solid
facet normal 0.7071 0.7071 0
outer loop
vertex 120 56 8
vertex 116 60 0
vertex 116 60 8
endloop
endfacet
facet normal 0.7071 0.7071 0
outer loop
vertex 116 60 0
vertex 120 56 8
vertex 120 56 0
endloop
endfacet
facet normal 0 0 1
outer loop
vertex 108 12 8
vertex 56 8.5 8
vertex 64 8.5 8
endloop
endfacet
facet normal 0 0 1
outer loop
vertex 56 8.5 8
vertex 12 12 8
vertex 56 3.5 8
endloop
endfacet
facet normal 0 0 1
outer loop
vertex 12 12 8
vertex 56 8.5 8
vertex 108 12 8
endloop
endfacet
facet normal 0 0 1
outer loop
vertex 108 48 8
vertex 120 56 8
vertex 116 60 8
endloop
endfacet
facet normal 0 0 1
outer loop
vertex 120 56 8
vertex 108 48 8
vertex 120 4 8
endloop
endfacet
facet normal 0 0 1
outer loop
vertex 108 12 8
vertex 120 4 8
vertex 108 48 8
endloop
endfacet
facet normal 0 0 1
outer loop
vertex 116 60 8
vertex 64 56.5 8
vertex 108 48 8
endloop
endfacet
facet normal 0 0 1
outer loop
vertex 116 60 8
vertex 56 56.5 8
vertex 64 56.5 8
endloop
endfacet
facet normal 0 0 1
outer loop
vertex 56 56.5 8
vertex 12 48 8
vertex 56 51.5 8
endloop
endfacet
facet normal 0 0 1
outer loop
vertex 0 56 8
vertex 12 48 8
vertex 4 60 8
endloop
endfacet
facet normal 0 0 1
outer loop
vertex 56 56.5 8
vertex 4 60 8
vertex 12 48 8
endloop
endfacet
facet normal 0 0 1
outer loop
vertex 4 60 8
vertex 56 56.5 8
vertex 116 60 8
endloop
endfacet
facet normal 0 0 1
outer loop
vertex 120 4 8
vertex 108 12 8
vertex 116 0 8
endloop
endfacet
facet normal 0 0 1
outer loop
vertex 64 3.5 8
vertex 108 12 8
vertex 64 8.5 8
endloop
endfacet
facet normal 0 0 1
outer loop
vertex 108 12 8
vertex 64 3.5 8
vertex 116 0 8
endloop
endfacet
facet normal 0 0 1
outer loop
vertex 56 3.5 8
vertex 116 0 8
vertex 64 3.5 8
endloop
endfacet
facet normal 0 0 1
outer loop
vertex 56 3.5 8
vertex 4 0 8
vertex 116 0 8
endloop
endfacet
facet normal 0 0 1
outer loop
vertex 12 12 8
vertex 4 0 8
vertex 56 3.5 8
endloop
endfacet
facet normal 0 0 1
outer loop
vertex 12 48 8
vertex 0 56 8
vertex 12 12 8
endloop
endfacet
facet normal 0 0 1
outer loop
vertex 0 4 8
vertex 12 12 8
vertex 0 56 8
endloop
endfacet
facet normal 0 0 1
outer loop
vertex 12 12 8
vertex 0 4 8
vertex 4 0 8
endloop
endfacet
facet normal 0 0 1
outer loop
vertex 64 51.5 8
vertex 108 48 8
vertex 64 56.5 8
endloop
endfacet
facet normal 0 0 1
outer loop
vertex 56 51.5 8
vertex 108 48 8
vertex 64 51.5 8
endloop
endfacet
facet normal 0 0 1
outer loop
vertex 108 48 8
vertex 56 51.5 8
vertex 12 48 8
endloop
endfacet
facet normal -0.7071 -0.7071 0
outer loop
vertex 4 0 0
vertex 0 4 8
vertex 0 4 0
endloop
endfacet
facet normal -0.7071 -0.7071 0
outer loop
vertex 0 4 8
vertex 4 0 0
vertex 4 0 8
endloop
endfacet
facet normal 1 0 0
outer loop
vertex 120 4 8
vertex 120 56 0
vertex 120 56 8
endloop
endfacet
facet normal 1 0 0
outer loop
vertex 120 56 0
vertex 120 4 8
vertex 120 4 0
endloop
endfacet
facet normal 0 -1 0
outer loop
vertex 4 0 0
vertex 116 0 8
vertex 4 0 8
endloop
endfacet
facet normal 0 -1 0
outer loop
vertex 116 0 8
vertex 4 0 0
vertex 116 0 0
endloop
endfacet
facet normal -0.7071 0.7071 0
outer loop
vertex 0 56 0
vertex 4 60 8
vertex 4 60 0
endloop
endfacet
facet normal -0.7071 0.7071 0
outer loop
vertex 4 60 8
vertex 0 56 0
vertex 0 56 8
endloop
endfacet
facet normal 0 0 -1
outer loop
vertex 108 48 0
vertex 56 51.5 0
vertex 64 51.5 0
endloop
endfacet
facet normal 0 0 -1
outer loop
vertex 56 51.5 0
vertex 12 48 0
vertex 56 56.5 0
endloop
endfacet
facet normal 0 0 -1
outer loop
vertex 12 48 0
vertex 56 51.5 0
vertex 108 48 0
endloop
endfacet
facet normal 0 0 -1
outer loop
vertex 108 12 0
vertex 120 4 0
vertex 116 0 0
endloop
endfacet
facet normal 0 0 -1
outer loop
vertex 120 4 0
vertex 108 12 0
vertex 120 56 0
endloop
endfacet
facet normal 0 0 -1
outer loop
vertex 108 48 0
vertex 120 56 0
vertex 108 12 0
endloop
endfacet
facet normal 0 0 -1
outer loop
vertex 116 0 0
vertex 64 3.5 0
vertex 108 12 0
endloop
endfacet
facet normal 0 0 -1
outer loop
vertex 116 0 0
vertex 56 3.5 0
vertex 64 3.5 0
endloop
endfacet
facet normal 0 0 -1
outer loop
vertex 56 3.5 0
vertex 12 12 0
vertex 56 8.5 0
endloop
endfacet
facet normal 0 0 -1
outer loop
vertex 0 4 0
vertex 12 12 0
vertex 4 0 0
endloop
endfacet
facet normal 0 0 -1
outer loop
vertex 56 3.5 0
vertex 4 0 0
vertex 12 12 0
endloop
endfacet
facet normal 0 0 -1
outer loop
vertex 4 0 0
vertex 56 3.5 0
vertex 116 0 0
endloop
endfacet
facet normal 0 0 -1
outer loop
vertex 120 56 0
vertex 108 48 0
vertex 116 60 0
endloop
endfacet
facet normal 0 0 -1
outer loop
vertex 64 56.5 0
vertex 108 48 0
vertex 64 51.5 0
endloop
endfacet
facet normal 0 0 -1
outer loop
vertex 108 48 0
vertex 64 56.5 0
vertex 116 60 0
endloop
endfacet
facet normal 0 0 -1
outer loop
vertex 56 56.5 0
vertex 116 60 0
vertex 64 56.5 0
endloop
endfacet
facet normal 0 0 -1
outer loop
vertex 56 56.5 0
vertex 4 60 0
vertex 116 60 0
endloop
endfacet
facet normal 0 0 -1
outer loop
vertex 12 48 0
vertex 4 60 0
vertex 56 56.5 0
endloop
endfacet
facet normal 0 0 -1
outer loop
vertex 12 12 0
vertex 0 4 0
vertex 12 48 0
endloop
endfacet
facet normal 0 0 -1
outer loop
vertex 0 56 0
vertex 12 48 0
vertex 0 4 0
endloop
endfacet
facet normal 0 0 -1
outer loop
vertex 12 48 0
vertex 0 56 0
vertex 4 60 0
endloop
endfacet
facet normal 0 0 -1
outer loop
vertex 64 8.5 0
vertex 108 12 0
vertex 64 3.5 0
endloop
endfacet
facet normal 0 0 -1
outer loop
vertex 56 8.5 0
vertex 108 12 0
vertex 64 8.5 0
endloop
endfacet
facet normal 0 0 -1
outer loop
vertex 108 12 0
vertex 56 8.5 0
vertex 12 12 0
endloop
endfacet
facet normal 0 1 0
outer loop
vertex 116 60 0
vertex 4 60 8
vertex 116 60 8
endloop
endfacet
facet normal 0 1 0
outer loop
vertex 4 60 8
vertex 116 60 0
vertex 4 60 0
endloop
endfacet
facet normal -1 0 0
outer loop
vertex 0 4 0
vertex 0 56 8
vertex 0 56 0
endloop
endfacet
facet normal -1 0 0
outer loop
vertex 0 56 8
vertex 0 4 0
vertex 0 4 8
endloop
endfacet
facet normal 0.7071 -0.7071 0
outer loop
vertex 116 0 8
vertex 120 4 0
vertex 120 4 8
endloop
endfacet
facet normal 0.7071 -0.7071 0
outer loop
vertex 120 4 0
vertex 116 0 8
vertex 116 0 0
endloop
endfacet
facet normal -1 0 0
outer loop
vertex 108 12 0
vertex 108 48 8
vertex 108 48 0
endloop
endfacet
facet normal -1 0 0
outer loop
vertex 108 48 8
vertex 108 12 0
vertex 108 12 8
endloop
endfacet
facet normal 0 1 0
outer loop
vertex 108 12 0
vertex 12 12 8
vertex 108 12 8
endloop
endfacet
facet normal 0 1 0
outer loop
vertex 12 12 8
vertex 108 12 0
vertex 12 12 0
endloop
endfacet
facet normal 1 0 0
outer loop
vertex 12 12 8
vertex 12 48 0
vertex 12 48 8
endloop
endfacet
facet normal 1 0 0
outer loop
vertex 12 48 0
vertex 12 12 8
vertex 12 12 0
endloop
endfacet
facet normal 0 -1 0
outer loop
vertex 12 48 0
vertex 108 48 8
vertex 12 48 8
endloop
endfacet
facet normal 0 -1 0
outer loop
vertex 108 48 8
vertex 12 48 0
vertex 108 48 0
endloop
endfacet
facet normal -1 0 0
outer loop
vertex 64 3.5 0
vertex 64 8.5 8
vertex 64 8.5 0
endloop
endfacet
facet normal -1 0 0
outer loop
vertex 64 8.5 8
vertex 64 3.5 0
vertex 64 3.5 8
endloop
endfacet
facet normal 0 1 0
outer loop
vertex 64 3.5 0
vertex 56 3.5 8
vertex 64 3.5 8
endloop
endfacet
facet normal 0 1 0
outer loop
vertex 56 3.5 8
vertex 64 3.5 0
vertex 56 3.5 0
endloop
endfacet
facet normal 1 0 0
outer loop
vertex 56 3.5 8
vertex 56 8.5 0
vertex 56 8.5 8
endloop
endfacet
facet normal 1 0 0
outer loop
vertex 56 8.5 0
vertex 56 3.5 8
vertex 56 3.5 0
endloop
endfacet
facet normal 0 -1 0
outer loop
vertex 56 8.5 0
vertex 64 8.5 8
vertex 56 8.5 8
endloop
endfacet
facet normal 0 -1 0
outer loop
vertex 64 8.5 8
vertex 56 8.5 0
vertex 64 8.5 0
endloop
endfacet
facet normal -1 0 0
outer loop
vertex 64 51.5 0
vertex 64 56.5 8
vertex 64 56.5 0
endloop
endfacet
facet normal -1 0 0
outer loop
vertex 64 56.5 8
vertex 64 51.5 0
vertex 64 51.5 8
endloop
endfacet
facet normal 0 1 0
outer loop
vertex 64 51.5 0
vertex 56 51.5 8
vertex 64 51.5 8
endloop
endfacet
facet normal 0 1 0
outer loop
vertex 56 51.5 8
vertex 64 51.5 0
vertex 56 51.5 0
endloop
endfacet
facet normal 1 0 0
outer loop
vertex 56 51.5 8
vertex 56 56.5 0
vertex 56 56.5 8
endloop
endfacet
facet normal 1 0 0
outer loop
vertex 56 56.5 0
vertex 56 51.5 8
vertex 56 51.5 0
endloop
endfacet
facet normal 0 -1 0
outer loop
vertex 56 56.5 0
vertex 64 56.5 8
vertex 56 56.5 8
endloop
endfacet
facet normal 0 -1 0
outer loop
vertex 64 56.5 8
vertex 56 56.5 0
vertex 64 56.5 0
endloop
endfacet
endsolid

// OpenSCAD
$fn = 32;

// ----------------------------------------------------------------------
// Frame plate: 120 x 60 frame, 12 mm rails
// ----------------------------------------------------------------------

// --- parameters (mm) ---
plate_l = 120;            // plate length, X
plate_w = 60;             // plate width, Y
plate_t = 8;              // plate thickness, Z (extrusion height)
corner_c = 4;             // corner chamfer
frame_bar = 12;           // frame rail width
slot_l = 8;               // adjustment slot length
slot_w = 5;               // adjustment slot width

win_l = plate_l - 2 * frame_bar;  // window length
win_w = plate_w - 2 * frame_bar;  // window width

profile = [[4, 0], [116, 0], [120, 4], [120, 56], [116, 60], [4, 60], [0, 56], [0, 4]];  // primary outline, 8 points, counter clockwise
void_1 = [[12, 12], [108, 12], [108, 48], [12, 48]];  // the window, 4 points
void_2 = [[56, 3.5], [64, 3.5], [64, 8.5], [56, 8.5]];  // adjustment slot, 4 points
void_3 = [[56, 51.5], [64, 51.5], [64, 56.5], [56, 56.5]];  // adjustment slot, 4 points

// --- the one profile operation ---
difference() {
  linear_extrude(height = plate_t) polygon(points = profile);
  translate([0, 0, -1])
    linear_extrude(height = plate_t + 2) polygon(points = void_1);
  translate([0, 0, -1])
    linear_extrude(height = plate_t + 2) polygon(points = void_2);
  translate([0, 0, -1])
    linear_extrude(height = plate_t + 2) polygon(points = void_3);
}
